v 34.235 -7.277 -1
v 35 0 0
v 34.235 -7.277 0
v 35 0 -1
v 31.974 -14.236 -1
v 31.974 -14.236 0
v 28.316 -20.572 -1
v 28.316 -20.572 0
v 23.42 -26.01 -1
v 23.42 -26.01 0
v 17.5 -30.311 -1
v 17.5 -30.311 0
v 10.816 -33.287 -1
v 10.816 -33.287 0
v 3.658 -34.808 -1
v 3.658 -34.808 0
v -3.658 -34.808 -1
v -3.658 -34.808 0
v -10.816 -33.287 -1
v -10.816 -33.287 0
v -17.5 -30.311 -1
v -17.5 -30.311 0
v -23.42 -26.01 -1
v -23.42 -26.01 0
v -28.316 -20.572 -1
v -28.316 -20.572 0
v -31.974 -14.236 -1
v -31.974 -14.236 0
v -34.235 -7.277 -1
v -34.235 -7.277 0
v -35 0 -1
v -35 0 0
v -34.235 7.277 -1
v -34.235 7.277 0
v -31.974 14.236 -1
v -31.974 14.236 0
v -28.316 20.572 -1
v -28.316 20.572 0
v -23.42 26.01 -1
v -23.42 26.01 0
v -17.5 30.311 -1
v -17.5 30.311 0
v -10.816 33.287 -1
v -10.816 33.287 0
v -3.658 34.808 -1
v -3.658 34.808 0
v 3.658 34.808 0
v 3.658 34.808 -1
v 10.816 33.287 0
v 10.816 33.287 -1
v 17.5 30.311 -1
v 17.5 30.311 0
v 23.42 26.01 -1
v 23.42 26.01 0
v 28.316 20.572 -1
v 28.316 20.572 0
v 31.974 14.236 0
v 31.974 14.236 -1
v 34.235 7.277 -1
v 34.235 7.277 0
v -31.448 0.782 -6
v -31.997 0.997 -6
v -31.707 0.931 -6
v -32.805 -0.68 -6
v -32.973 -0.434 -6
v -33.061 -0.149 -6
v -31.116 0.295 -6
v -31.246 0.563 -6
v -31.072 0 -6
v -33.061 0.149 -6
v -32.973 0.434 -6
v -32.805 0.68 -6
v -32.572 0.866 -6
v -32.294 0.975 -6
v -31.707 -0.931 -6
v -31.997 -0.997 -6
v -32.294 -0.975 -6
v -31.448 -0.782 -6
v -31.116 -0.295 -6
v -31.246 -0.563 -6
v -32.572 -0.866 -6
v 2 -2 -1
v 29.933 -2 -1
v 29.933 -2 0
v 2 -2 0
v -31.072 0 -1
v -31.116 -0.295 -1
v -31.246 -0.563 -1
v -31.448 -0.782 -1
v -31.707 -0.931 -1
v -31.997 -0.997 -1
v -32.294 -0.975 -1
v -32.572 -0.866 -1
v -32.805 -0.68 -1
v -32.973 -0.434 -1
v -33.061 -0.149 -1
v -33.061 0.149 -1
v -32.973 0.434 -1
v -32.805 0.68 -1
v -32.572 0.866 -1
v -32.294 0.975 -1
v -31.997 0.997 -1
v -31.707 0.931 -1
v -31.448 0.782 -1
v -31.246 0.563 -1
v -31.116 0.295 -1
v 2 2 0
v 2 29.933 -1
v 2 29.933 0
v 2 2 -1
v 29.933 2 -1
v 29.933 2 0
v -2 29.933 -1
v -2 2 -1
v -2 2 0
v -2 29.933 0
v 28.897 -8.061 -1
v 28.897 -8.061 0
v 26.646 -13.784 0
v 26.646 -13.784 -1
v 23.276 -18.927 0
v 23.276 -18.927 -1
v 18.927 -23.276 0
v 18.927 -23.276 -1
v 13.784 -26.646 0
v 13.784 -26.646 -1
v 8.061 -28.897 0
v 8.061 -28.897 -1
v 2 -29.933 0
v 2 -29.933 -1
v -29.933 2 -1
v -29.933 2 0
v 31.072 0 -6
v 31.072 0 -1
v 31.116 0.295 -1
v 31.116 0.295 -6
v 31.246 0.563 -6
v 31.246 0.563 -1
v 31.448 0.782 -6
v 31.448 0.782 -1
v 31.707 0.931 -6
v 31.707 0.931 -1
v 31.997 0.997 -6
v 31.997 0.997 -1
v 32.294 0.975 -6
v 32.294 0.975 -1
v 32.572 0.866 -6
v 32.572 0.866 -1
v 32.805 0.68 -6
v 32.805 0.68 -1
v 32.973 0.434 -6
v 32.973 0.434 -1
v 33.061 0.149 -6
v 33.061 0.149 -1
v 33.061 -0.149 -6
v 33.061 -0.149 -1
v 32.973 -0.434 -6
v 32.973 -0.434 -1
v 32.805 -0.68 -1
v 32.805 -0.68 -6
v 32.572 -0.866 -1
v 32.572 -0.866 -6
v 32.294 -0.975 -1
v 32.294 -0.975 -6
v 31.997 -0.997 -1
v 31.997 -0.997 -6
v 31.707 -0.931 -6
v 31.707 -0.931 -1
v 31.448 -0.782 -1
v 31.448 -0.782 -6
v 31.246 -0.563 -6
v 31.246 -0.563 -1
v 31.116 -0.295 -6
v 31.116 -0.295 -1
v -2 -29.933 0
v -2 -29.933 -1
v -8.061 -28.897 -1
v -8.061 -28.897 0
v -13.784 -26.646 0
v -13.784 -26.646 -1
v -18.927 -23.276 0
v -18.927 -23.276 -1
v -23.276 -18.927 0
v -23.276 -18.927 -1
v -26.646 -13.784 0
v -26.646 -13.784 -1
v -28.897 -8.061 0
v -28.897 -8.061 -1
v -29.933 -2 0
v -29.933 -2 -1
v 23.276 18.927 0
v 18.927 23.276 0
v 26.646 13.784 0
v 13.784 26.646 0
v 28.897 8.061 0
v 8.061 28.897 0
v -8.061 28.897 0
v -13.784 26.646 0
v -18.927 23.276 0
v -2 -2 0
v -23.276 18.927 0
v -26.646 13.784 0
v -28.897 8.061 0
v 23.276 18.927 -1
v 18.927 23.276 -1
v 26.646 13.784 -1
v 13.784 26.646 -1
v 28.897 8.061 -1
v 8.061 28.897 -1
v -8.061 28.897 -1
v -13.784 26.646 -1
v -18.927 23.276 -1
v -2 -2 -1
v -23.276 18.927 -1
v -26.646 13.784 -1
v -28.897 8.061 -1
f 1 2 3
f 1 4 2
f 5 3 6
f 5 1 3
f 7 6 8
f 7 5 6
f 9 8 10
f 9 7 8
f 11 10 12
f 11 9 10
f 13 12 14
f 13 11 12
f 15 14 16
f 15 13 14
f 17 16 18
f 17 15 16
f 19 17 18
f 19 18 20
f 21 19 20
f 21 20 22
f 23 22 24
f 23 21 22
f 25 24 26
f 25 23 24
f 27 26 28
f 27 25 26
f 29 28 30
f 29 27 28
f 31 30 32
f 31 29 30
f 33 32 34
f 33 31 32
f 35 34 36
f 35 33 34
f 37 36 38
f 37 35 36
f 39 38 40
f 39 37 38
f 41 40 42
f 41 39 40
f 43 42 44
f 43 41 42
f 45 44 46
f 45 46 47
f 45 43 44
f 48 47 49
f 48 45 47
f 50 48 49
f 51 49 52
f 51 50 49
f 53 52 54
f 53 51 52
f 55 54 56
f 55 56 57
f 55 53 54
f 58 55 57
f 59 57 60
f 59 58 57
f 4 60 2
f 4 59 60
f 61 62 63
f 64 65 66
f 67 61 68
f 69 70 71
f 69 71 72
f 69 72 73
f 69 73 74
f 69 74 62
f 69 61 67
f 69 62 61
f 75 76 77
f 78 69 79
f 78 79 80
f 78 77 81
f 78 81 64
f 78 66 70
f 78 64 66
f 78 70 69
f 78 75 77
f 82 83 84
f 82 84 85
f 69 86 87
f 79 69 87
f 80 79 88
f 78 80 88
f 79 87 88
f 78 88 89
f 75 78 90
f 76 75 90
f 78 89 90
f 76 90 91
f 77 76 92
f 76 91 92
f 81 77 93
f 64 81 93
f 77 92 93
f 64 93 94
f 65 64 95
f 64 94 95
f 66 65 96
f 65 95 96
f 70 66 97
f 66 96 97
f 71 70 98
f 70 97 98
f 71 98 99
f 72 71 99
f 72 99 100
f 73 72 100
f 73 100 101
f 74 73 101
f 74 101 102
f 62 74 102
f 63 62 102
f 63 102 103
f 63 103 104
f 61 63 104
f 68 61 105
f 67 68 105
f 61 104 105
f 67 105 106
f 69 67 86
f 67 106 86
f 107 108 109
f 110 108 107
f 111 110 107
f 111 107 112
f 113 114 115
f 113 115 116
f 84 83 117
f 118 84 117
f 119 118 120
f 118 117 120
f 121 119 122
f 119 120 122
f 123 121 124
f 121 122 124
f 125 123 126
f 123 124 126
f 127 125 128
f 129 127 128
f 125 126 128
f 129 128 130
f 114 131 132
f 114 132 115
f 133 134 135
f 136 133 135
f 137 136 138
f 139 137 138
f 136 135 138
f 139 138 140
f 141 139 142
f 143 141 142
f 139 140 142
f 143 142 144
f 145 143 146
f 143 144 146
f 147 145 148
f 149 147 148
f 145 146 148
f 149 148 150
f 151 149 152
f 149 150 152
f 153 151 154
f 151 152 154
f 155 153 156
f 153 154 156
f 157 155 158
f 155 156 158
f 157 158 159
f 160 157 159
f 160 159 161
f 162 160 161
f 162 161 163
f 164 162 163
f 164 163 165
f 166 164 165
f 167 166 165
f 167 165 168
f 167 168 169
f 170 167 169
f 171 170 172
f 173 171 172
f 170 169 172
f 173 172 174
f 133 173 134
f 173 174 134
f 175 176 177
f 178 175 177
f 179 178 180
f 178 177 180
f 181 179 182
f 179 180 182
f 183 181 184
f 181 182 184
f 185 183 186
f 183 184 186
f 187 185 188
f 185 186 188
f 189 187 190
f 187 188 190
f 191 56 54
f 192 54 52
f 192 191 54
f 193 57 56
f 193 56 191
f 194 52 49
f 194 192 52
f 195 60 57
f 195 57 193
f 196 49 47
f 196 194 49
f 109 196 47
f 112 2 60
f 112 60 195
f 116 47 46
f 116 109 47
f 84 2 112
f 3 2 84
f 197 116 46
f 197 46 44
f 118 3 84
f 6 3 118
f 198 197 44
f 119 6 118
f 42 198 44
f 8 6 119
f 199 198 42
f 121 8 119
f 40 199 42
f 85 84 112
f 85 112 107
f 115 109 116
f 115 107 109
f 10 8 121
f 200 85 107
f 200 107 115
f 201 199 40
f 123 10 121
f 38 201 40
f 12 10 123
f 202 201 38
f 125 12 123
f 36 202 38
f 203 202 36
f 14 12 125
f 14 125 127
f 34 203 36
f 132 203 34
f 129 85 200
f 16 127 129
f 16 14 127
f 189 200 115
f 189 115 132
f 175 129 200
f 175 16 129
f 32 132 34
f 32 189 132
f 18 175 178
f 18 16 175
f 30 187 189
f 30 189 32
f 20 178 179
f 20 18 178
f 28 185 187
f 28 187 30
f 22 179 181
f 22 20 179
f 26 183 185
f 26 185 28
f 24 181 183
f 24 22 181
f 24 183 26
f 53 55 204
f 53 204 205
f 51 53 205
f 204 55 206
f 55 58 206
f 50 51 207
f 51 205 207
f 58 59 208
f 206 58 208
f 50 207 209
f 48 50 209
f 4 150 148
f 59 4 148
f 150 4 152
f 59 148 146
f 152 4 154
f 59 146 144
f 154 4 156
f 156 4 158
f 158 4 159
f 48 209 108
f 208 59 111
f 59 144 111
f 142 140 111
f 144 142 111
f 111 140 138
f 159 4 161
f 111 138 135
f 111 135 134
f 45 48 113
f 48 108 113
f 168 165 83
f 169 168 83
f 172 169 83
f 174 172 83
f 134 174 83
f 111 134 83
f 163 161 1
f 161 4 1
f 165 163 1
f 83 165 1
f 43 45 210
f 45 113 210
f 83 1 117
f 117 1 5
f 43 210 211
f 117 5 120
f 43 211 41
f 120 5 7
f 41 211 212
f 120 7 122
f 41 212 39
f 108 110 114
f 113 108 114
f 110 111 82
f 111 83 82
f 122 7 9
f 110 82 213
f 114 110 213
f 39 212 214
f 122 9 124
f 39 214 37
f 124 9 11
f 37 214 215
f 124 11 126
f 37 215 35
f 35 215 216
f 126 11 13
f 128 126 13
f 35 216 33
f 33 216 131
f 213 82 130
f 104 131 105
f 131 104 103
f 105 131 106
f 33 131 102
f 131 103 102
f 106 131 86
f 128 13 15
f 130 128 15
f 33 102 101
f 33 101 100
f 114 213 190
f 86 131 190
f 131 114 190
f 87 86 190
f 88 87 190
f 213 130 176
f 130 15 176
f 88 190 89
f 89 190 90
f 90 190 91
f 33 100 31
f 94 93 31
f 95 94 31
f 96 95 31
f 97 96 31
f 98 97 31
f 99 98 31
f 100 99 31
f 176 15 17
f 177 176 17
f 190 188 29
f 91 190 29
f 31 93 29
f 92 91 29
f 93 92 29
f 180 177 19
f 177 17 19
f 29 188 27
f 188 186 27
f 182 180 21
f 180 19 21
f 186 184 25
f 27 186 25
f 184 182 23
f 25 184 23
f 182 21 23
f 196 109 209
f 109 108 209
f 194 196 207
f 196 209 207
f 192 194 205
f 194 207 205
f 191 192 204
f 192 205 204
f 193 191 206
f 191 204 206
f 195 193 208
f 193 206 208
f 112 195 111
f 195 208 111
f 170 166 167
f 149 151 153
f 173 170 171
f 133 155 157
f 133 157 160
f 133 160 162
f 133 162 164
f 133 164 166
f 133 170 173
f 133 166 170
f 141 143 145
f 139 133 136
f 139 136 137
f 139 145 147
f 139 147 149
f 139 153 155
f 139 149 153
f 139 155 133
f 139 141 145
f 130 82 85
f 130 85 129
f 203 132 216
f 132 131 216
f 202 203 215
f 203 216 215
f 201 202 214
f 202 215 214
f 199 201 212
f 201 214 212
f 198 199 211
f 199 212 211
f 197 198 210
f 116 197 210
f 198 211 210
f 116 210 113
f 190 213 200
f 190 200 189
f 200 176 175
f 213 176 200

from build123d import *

# Parameters (mm, degrees)
SKETCH1_W           = 5
SKETCH1_H           = 1
BOSS_EXTRUDE1_DEPTH = 1
SKETCH3_R           = 1
BOSS_EXTRUDE2_DEPTH = 5


with BuildPart() as part:
    # Sketch1 → Revolve1 (revolve)
    with BuildSketch(Plane(origin=(0, 0, 0), x_dir=(1, 0, 0), z_dir=(0, 1, 0))):
        with Locations((32.5, 0.5)):
            Rectangle(SKETCH1_W, SKETCH1_H)
    revolve(axis=Axis((0, 0, 0), (0, 0, -1)))

    # Sketch2 → Boss-Extrude1 (add)
    with BuildSketch(Plane(origin=(0, 0, -1), x_dir=(-1, 0, 0), z_dir=(0, 0, -1))):
        Polygon((-2, -30.927225956), (2, -30.927225956), (2, -2), (31.252775703, -2), (31.252775703, 2), (2, 2), (2, 30.927225956), (-2, 30.927225956), (-2, 2), (-31.252775703, 2), (-31.252775703, -2), (-2, -2), align=None)
    extrude(amount=-BOSS_EXTRUDE1_DEPTH)

    # Sketch3 → Boss-Extrude2 (add)
    with BuildSketch(Plane(origin=(0, 0, -1), x_dir=(-1, 0, 0), z_dir=(0, 0, -1))):
        with Locations((-32.071898489, 0)):
            Circle(SKETCH3_R)
        with Locations(Location((32.071898489, 0, 0), (0, 0, 180))):
            Circle(SKETCH3_R)
    extrude(amount=BOSS_EXTRUDE2_DEPTH)


solid = part.part
